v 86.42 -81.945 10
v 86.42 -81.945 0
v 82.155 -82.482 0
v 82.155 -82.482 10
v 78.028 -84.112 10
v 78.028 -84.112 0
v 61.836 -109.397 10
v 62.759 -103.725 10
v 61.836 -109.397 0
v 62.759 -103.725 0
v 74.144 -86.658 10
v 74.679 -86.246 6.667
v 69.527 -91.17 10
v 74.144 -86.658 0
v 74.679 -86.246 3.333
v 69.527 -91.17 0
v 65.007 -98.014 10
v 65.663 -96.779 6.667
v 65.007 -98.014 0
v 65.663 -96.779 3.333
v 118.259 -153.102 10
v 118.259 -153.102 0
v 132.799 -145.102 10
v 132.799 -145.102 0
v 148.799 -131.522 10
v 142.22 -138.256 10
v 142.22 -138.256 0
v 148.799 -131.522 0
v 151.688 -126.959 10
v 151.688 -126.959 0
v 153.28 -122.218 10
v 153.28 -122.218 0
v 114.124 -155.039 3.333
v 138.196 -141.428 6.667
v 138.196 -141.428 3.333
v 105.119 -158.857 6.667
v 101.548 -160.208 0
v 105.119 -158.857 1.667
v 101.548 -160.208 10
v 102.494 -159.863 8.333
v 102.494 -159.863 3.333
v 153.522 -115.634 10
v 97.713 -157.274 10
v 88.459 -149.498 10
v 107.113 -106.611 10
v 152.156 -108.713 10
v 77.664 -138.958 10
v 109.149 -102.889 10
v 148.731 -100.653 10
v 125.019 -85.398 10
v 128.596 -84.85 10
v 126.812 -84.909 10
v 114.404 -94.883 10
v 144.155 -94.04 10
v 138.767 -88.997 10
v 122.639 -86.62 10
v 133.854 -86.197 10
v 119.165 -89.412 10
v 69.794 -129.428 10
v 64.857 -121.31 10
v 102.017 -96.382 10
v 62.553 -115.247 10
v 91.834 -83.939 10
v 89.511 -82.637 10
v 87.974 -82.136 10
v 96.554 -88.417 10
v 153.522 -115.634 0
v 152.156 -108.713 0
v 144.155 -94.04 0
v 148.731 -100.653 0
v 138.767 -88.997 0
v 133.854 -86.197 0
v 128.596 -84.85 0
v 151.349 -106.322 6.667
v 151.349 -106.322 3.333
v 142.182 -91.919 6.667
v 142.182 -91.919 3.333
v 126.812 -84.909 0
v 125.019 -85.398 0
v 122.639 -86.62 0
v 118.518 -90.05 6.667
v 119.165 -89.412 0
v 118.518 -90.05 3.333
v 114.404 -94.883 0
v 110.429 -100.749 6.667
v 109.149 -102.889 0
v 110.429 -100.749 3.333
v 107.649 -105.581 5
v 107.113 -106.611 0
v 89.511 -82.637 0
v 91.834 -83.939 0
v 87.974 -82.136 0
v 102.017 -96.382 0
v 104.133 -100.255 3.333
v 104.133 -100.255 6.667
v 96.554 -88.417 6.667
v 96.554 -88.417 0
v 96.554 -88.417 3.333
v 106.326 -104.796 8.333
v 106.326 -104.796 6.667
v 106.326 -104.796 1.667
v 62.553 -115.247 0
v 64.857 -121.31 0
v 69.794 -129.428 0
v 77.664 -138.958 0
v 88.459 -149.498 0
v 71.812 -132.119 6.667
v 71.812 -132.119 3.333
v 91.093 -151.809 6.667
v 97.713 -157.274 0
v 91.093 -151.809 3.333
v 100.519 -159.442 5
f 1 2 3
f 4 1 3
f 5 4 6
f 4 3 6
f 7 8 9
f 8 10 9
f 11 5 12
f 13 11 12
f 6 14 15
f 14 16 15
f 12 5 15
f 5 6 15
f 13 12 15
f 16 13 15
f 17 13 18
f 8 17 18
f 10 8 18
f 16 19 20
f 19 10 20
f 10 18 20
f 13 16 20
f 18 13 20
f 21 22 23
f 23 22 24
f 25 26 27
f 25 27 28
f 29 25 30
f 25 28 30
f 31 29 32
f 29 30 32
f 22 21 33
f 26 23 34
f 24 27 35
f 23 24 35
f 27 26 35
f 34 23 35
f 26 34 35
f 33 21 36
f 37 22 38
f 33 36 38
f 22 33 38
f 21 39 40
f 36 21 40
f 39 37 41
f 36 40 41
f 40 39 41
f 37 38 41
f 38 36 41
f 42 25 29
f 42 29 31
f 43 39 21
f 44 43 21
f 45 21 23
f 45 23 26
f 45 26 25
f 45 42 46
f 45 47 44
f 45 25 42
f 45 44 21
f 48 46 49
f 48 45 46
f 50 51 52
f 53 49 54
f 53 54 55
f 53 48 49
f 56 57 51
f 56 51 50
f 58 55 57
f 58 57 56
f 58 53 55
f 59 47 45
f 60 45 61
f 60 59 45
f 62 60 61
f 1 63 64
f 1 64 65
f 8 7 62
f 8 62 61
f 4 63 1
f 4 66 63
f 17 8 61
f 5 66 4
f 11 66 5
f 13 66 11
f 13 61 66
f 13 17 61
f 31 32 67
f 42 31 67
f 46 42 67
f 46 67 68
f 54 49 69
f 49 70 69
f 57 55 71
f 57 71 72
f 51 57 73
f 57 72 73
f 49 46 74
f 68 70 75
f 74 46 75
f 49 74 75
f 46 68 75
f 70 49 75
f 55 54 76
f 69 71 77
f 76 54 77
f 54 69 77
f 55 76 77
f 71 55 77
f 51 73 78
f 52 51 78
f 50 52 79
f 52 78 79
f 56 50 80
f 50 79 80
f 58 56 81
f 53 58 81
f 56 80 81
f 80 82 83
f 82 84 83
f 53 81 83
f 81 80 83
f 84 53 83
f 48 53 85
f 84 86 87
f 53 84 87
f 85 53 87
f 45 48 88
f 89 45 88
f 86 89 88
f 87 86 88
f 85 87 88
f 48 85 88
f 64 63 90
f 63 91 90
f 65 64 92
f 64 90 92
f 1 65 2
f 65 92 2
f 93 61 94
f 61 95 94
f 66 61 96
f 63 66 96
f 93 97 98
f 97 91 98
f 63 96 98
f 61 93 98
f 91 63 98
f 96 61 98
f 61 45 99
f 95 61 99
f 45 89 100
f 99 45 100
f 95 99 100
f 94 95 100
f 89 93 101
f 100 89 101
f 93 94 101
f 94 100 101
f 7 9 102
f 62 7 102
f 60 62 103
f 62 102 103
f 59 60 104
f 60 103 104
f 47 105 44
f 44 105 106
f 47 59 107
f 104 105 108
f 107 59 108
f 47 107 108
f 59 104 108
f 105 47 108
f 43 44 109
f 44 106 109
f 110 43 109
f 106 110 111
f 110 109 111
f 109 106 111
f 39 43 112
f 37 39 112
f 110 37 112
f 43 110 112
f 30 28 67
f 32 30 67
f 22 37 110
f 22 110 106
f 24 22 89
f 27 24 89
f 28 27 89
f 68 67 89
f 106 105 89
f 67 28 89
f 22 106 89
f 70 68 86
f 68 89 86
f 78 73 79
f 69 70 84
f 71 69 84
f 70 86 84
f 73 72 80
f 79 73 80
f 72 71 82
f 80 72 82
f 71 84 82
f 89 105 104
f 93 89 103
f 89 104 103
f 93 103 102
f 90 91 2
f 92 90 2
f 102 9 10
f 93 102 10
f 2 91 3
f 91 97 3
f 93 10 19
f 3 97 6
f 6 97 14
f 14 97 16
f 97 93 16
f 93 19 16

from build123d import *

# Parameters (mm, degrees)
EXTRUDE_DEPTH = 10


with BuildPart() as part:
    # path1 → Extrude (new body)
    with BuildSketch(Plane(origin=(108.25789, -120.977486, 0), x_dir=(0, 1, 0), z_dir=(0, 0, 1))):
        with BuildLine():
            add(Edge.make_bspline(
                [(-39.230663, 6.70963), (-39.230663, 6.70963), (-22.301203, -41.2591), (-1.240513, -45.02194)],
                knots=[0, 0, 0, 0, 1, 1, 1, 1], degree=3))
            add(Edge.make_bspline(
                [(-1.240513, -45.02194), (13.454927, -47.64753), (34.672536, -35.19502), (36.127187, -20.33791)],
                knots=[0, 0, 0, 0, 1, 1, 1, 1], degree=3))
            add(Edge.make_bspline(
                [(36.127187, -20.33791), (37.120399, -10.19372), (14.366627, 1.14457), (14.366627, 1.14457)],
                knots=[0, 0, 0, 0, 1, 1, 1, 1], degree=3))
            add(Edge.make_bspline(
                [(14.366627, 1.14457), (14.366627, 1.14457), (38.859006, 11.107047), (39.03231, 21.837759)],
                knots=[0, 0, 0, 0, 1, 1, 1, 1], degree=3))
            add(Edge.make_bspline(
                [(39.03231, 21.837759), (39.230664, 34.119576), (23.857324, 46.010292), (11.580787, 46.421398)],
                knots=[0, 0, 0, 0, 1, 1, 1, 1], degree=3))
            add(Edge.make_bspline(
                [(11.580787, 46.421398), (-9.903493, 47.140845), (-39.230663, 6.70963), (-39.230663, 6.70963)],
                knots=[0, 0, 0, 0, 1, 1, 1, 1], degree=3))
        make_face()
    extrude(amount=EXTRUDE_DEPTH)


solid = part.part
